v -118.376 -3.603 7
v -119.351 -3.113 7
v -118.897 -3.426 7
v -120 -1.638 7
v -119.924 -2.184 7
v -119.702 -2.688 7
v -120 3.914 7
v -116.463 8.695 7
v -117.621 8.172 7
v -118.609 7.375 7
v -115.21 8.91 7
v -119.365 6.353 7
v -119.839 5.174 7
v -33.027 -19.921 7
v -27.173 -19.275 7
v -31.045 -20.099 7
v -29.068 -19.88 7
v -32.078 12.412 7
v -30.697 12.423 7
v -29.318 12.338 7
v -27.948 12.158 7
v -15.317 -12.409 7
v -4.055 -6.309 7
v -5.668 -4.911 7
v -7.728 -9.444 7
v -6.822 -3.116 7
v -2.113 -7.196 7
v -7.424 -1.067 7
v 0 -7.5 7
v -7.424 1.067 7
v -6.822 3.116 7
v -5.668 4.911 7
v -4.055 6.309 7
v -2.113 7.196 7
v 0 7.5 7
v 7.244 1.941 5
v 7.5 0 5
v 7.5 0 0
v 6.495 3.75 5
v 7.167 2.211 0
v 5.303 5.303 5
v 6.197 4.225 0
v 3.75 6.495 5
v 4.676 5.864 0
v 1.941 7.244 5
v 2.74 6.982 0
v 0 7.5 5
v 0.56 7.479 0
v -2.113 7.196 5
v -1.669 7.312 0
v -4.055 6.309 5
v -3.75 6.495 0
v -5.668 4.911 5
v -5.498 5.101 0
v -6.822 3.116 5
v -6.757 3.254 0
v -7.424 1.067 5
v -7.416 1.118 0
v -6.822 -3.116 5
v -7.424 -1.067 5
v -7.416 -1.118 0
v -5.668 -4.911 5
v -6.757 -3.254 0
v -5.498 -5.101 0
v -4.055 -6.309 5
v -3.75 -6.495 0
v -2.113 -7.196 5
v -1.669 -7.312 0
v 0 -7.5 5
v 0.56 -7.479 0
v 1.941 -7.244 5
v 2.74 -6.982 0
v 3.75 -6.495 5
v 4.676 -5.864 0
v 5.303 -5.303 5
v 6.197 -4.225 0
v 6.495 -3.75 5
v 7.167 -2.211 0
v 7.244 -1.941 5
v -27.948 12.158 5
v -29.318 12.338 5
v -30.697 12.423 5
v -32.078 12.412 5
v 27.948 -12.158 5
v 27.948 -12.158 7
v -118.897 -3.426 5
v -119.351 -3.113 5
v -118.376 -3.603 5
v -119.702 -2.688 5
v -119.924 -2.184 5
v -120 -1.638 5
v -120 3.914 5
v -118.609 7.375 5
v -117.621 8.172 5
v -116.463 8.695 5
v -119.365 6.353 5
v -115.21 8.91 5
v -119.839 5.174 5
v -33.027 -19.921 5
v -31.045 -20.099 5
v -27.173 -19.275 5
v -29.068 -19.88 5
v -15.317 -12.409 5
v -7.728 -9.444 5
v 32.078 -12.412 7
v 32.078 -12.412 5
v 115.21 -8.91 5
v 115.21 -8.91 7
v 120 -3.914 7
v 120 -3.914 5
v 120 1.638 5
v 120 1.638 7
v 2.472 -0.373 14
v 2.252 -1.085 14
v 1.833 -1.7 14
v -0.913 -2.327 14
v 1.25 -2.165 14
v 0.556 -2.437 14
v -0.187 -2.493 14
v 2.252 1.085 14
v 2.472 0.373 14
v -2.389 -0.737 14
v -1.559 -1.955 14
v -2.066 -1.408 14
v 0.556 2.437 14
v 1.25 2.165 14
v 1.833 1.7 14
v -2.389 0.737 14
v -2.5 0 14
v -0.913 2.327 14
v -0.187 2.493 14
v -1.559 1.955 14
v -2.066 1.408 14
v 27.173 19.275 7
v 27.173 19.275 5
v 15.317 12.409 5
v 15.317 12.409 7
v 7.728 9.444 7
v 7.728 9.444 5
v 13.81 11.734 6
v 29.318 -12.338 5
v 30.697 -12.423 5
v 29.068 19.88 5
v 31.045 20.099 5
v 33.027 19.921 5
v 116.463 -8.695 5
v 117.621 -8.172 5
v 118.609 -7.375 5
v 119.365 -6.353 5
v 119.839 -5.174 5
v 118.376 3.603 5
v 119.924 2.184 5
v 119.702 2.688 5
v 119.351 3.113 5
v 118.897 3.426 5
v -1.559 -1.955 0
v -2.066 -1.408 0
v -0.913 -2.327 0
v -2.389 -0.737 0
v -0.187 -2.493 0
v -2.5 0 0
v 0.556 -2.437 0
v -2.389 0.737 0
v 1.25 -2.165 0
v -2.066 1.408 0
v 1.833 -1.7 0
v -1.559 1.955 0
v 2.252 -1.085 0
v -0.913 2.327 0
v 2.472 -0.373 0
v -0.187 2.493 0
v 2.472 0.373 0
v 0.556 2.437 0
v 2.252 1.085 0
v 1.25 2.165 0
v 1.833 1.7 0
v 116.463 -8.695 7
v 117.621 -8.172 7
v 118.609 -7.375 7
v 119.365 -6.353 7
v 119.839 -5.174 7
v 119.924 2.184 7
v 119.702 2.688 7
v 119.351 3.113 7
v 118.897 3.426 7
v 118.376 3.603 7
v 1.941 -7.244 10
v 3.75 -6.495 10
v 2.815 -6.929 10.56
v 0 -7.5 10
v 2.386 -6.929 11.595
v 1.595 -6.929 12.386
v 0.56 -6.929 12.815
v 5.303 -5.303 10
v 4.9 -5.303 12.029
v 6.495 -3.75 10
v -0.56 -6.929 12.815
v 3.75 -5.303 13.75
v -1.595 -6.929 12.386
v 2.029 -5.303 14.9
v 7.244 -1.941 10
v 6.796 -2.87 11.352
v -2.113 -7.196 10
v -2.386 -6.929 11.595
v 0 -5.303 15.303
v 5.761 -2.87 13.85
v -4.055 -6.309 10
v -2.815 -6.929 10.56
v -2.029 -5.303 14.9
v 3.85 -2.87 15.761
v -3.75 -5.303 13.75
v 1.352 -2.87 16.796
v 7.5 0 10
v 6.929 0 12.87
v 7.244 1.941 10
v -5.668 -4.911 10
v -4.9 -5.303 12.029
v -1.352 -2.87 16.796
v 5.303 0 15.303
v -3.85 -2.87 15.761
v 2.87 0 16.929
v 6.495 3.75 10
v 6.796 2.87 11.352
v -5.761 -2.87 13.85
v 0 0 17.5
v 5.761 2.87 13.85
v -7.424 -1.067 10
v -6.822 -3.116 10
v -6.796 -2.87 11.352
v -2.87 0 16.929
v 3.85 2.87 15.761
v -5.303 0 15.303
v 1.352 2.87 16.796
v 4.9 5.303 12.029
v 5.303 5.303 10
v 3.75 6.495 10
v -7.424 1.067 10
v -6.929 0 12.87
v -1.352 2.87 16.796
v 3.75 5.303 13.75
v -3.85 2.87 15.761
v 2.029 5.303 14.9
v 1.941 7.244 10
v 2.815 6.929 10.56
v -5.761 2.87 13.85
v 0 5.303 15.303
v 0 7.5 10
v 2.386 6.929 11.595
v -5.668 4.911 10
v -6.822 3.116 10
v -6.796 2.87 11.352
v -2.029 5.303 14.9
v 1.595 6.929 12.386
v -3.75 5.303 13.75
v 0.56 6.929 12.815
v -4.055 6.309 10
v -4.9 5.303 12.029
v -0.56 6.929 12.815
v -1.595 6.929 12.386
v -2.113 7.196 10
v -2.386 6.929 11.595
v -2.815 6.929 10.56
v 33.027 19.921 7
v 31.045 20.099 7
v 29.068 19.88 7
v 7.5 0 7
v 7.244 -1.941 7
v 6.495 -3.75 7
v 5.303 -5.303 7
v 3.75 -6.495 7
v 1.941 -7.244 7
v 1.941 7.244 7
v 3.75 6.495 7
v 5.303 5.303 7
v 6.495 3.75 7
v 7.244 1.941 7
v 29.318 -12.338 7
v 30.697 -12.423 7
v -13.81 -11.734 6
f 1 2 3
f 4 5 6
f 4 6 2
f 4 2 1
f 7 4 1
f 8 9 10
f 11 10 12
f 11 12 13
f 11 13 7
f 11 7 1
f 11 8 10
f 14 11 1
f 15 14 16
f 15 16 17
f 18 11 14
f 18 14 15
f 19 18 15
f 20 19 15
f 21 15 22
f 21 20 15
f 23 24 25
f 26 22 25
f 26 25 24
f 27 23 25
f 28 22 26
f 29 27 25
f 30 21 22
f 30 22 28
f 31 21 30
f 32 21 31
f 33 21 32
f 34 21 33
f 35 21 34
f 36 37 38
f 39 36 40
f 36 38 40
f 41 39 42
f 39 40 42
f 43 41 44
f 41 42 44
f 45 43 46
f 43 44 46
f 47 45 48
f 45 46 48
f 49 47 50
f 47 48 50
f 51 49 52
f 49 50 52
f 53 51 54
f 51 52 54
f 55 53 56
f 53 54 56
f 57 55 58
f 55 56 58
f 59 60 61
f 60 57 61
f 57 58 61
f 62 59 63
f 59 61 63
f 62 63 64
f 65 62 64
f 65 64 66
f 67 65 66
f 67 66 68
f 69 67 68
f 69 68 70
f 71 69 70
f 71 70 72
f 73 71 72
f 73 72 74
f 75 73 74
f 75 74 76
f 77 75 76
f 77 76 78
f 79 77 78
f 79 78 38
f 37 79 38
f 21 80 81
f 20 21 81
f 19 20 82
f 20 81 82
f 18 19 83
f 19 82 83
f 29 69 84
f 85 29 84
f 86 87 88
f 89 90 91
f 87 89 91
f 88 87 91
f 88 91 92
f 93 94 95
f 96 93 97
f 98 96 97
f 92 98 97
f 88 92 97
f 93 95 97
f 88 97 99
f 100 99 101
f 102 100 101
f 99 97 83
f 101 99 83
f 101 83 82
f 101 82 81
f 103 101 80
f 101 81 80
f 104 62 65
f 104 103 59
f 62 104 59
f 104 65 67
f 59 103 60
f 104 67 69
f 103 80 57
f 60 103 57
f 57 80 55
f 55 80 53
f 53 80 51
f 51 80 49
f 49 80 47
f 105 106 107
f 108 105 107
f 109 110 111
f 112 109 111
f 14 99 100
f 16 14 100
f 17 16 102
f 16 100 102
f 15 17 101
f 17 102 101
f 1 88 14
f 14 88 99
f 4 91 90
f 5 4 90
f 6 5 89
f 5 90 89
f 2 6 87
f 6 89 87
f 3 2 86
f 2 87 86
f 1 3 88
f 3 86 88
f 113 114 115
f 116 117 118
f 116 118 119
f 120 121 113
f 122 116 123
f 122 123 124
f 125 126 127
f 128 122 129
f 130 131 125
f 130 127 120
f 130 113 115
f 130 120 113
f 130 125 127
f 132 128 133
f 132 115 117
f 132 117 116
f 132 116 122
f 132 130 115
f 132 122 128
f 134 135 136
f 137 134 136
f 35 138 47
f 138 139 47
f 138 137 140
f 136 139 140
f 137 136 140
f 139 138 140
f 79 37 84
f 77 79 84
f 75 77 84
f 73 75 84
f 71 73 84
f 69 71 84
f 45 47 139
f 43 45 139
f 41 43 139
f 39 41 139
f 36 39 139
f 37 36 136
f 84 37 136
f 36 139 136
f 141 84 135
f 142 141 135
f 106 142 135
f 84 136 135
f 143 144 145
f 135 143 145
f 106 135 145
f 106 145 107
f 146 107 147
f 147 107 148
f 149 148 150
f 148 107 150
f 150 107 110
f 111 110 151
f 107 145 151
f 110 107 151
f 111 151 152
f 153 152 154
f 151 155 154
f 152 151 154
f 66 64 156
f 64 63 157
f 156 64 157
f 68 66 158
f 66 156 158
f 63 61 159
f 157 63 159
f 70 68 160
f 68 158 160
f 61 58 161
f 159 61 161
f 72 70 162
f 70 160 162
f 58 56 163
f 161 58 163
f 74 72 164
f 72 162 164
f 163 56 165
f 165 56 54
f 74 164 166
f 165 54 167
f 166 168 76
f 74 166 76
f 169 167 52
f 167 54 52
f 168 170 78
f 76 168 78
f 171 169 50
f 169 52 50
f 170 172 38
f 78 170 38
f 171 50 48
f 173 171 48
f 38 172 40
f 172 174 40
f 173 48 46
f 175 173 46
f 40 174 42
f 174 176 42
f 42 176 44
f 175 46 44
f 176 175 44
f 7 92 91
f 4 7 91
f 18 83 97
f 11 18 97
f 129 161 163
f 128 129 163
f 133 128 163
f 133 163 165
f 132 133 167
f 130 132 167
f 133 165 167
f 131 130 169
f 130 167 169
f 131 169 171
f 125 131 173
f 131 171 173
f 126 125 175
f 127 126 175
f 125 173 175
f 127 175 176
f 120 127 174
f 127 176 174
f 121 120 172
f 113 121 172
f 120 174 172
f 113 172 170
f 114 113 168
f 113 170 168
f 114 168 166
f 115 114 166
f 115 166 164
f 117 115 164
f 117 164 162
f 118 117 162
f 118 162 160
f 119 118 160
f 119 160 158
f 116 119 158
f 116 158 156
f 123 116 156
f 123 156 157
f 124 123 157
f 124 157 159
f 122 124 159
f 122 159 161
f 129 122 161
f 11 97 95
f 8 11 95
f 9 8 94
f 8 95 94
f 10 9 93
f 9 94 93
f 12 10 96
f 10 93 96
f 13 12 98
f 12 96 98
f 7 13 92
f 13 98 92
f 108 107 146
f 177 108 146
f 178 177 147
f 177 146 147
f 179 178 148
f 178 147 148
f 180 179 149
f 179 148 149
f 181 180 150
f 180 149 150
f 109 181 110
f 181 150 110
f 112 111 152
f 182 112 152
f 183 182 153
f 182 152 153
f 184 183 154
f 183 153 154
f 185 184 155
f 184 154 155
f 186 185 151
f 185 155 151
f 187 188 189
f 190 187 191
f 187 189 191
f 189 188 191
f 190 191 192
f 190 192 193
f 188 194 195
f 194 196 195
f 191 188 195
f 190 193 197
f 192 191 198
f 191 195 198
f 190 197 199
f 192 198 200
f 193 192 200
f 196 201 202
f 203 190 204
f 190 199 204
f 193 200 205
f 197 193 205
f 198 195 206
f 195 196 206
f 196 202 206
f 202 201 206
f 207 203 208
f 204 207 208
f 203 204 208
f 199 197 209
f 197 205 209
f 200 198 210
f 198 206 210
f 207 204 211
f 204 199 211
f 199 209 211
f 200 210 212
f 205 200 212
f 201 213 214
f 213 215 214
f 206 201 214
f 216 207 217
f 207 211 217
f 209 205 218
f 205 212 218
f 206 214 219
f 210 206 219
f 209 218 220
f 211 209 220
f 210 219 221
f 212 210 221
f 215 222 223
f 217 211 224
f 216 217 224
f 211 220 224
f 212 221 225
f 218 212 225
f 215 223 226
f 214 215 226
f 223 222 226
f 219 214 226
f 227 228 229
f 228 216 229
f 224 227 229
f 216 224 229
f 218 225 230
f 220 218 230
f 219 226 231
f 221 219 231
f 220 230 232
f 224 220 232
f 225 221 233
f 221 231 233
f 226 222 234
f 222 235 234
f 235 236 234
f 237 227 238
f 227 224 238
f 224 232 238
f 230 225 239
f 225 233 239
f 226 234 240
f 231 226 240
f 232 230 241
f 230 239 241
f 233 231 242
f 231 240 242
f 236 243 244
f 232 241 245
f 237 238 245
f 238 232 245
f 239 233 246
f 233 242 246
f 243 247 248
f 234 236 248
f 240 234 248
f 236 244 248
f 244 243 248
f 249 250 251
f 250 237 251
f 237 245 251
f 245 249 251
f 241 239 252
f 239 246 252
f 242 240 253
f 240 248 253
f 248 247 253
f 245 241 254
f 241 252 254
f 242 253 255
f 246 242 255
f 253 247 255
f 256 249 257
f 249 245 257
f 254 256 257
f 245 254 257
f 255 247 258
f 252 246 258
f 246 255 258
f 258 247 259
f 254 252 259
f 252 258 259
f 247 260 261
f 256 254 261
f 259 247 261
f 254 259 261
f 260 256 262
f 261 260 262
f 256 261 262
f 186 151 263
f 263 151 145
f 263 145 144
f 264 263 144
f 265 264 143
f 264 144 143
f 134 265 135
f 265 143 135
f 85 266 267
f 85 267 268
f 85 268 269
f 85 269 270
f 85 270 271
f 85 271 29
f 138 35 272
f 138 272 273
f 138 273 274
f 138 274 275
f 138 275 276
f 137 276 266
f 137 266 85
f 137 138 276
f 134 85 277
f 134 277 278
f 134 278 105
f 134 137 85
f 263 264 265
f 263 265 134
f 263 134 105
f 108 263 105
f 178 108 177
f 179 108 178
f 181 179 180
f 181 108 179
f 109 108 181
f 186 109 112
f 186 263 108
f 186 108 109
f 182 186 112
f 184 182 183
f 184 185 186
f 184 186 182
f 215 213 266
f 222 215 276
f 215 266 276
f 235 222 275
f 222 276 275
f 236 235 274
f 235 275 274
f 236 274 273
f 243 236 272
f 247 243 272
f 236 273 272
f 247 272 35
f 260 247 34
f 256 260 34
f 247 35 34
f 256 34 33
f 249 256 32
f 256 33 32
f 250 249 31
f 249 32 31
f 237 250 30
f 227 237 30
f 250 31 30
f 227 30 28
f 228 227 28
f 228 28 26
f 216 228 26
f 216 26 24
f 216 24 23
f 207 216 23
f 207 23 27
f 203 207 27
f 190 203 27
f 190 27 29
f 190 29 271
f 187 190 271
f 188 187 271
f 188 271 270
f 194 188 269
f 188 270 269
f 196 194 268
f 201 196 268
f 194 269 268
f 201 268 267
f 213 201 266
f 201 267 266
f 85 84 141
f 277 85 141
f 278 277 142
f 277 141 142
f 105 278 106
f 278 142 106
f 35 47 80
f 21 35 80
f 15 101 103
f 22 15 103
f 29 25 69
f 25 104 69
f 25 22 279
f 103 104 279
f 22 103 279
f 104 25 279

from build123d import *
from build123d.topology import SkipClean

# Parameters (mm, degrees)
SKETCH_1_R          = 7.5
EXTRUDE_1_DEPTH     = 10
SKETCH_5_R          = 2.5
CUT_EXTRUDE_1_DEPTH = 14
EXTRUDE_2_DEPTH     = 2
SKETCH_8_R          = 2.5
CUT_EXTRUDE_2_DEPTH = 12


with BuildPart() as part:
    # 스케치1 → 보스-돌출1 (new body)
    with BuildSketch(Plane.XY):
        Circle(SKETCH_1_R)
    extrude(amount=EXTRUDE_1_DEPTH)

    # 스케치4 → 회전4 (revolve)
    with SkipClean():  # the faces are left unmerged after this step: merging them gives an invalid solid
        with BuildSketch(Plane(origin=(0, 0, 0), x_dir=(0, -1, 0), z_dir=(-1, 0, 0))):
            with BuildLine():
                ThreePointArc((7.5, 10), (0, 17.5), (-7.5, 10))
                Line((-7.5, 10), (7.5, 10))
            make_face()
        revolve(axis=Axis((0, 7.5, 10), (0, -1, 0)))

    # 스케치5 → 컷-돌출1 (cut)
    with SkipClean():  # the faces are left unmerged after this step: merging them gives an invalid solid
        with BuildSketch(Plane(origin=(0, 0, 0), x_dir=(-1, 0, 0), z_dir=(0, 0, -1))):
            Circle(SKETCH_5_R)
        extrude(amount=-CUT_EXTRUDE_1_DEPTH, mode=Mode.SUBTRACT)

    # 스케치7 → 보스-돌출2 (add)
    with BuildSketch(Plane(origin=(0, 0, 5), x_dir=(-1, 0, 0), z_dir=(0, 0, -1))):
        with BuildLine():
            ThreePointArc((118.375596223, -3.602585224), (119.541296929, -2.912690922), (120, -1.638169923))
            Line((120, -1.638169923), (120, 3.91423134))
            ThreePointArc((120, 3.91423134), (118.609182692, 7.374549287), (115.210479882, 8.909799198))
            Line((115.210479882, 8.909799198), (32.07817821, 12.412439443))
            ThreePointArc((32.07817821, 12.412439443), (30.006632076, 12.392332685), (27.948278937, 12.158046489))
            Line((27.948278937, 12.158046489), (0, 7.5))
            add(Edge.make_bspline(
                [(-27.172583756, 19.274786294), (-14.034416748, 10.081105305), (0, 7.5)],
                knots=[0, 0, 0, 1, 1, 1], degree=2))
            ThreePointArc((-27.172583756, 19.274786294), (-30.05093506, 20.03879764), (-33.026639247, 19.921306549))
            Line((-33.026639247, 19.921306549), (-118.375596223, 3.602585224))
            ThreePointArc((-118.375596223, 3.602585224), (-119.541296929, 2.912690922), (-120, 1.638169923))
            Line((-120, 1.638169923), (-120, -3.91423134))
            ThreePointArc((-120, -3.91423134), (-118.609182692, -7.374549287), (-115.210479882, -8.909799198))
            Line((-115.210479882, -8.909799198), (-32.07817821, -12.412439443))
            ThreePointArc((-32.07817821, -12.412439443), (-30.006632076, -12.392332685), (-27.948278937, -12.158046489))
            Line((-27.948278937, -12.158046489), (0, -7.5))
            add(Edge.make_bspline(
                [(27.172583756, -19.274786294), (14.034416748, -10.081105305), (0, -7.5)],
                knots=[0, 0, 0, 1, 1, 1], degree=2))
            ThreePointArc((27.172583756, -19.274786294), (30.05093506, -20.03879764), (33.026639247, -19.921306549))
            Line((33.026639247, -19.921306549), (118.375596223, -3.602585224))
        make_face()
    extrude(amount=-EXTRUDE_2_DEPTH)

    # 스케치8 → 컷-돌출2 (cut)
    with BuildSketch(Plane(origin=(0, 0, 0), x_dir=(-1, 0, 0), z_dir=(0, 0, -1))):
        Circle(SKETCH_8_R)
    extrude(amount=-CUT_EXTRUDE_2_DEPTH, mode=Mode.SUBTRACT)


solid = part.part
